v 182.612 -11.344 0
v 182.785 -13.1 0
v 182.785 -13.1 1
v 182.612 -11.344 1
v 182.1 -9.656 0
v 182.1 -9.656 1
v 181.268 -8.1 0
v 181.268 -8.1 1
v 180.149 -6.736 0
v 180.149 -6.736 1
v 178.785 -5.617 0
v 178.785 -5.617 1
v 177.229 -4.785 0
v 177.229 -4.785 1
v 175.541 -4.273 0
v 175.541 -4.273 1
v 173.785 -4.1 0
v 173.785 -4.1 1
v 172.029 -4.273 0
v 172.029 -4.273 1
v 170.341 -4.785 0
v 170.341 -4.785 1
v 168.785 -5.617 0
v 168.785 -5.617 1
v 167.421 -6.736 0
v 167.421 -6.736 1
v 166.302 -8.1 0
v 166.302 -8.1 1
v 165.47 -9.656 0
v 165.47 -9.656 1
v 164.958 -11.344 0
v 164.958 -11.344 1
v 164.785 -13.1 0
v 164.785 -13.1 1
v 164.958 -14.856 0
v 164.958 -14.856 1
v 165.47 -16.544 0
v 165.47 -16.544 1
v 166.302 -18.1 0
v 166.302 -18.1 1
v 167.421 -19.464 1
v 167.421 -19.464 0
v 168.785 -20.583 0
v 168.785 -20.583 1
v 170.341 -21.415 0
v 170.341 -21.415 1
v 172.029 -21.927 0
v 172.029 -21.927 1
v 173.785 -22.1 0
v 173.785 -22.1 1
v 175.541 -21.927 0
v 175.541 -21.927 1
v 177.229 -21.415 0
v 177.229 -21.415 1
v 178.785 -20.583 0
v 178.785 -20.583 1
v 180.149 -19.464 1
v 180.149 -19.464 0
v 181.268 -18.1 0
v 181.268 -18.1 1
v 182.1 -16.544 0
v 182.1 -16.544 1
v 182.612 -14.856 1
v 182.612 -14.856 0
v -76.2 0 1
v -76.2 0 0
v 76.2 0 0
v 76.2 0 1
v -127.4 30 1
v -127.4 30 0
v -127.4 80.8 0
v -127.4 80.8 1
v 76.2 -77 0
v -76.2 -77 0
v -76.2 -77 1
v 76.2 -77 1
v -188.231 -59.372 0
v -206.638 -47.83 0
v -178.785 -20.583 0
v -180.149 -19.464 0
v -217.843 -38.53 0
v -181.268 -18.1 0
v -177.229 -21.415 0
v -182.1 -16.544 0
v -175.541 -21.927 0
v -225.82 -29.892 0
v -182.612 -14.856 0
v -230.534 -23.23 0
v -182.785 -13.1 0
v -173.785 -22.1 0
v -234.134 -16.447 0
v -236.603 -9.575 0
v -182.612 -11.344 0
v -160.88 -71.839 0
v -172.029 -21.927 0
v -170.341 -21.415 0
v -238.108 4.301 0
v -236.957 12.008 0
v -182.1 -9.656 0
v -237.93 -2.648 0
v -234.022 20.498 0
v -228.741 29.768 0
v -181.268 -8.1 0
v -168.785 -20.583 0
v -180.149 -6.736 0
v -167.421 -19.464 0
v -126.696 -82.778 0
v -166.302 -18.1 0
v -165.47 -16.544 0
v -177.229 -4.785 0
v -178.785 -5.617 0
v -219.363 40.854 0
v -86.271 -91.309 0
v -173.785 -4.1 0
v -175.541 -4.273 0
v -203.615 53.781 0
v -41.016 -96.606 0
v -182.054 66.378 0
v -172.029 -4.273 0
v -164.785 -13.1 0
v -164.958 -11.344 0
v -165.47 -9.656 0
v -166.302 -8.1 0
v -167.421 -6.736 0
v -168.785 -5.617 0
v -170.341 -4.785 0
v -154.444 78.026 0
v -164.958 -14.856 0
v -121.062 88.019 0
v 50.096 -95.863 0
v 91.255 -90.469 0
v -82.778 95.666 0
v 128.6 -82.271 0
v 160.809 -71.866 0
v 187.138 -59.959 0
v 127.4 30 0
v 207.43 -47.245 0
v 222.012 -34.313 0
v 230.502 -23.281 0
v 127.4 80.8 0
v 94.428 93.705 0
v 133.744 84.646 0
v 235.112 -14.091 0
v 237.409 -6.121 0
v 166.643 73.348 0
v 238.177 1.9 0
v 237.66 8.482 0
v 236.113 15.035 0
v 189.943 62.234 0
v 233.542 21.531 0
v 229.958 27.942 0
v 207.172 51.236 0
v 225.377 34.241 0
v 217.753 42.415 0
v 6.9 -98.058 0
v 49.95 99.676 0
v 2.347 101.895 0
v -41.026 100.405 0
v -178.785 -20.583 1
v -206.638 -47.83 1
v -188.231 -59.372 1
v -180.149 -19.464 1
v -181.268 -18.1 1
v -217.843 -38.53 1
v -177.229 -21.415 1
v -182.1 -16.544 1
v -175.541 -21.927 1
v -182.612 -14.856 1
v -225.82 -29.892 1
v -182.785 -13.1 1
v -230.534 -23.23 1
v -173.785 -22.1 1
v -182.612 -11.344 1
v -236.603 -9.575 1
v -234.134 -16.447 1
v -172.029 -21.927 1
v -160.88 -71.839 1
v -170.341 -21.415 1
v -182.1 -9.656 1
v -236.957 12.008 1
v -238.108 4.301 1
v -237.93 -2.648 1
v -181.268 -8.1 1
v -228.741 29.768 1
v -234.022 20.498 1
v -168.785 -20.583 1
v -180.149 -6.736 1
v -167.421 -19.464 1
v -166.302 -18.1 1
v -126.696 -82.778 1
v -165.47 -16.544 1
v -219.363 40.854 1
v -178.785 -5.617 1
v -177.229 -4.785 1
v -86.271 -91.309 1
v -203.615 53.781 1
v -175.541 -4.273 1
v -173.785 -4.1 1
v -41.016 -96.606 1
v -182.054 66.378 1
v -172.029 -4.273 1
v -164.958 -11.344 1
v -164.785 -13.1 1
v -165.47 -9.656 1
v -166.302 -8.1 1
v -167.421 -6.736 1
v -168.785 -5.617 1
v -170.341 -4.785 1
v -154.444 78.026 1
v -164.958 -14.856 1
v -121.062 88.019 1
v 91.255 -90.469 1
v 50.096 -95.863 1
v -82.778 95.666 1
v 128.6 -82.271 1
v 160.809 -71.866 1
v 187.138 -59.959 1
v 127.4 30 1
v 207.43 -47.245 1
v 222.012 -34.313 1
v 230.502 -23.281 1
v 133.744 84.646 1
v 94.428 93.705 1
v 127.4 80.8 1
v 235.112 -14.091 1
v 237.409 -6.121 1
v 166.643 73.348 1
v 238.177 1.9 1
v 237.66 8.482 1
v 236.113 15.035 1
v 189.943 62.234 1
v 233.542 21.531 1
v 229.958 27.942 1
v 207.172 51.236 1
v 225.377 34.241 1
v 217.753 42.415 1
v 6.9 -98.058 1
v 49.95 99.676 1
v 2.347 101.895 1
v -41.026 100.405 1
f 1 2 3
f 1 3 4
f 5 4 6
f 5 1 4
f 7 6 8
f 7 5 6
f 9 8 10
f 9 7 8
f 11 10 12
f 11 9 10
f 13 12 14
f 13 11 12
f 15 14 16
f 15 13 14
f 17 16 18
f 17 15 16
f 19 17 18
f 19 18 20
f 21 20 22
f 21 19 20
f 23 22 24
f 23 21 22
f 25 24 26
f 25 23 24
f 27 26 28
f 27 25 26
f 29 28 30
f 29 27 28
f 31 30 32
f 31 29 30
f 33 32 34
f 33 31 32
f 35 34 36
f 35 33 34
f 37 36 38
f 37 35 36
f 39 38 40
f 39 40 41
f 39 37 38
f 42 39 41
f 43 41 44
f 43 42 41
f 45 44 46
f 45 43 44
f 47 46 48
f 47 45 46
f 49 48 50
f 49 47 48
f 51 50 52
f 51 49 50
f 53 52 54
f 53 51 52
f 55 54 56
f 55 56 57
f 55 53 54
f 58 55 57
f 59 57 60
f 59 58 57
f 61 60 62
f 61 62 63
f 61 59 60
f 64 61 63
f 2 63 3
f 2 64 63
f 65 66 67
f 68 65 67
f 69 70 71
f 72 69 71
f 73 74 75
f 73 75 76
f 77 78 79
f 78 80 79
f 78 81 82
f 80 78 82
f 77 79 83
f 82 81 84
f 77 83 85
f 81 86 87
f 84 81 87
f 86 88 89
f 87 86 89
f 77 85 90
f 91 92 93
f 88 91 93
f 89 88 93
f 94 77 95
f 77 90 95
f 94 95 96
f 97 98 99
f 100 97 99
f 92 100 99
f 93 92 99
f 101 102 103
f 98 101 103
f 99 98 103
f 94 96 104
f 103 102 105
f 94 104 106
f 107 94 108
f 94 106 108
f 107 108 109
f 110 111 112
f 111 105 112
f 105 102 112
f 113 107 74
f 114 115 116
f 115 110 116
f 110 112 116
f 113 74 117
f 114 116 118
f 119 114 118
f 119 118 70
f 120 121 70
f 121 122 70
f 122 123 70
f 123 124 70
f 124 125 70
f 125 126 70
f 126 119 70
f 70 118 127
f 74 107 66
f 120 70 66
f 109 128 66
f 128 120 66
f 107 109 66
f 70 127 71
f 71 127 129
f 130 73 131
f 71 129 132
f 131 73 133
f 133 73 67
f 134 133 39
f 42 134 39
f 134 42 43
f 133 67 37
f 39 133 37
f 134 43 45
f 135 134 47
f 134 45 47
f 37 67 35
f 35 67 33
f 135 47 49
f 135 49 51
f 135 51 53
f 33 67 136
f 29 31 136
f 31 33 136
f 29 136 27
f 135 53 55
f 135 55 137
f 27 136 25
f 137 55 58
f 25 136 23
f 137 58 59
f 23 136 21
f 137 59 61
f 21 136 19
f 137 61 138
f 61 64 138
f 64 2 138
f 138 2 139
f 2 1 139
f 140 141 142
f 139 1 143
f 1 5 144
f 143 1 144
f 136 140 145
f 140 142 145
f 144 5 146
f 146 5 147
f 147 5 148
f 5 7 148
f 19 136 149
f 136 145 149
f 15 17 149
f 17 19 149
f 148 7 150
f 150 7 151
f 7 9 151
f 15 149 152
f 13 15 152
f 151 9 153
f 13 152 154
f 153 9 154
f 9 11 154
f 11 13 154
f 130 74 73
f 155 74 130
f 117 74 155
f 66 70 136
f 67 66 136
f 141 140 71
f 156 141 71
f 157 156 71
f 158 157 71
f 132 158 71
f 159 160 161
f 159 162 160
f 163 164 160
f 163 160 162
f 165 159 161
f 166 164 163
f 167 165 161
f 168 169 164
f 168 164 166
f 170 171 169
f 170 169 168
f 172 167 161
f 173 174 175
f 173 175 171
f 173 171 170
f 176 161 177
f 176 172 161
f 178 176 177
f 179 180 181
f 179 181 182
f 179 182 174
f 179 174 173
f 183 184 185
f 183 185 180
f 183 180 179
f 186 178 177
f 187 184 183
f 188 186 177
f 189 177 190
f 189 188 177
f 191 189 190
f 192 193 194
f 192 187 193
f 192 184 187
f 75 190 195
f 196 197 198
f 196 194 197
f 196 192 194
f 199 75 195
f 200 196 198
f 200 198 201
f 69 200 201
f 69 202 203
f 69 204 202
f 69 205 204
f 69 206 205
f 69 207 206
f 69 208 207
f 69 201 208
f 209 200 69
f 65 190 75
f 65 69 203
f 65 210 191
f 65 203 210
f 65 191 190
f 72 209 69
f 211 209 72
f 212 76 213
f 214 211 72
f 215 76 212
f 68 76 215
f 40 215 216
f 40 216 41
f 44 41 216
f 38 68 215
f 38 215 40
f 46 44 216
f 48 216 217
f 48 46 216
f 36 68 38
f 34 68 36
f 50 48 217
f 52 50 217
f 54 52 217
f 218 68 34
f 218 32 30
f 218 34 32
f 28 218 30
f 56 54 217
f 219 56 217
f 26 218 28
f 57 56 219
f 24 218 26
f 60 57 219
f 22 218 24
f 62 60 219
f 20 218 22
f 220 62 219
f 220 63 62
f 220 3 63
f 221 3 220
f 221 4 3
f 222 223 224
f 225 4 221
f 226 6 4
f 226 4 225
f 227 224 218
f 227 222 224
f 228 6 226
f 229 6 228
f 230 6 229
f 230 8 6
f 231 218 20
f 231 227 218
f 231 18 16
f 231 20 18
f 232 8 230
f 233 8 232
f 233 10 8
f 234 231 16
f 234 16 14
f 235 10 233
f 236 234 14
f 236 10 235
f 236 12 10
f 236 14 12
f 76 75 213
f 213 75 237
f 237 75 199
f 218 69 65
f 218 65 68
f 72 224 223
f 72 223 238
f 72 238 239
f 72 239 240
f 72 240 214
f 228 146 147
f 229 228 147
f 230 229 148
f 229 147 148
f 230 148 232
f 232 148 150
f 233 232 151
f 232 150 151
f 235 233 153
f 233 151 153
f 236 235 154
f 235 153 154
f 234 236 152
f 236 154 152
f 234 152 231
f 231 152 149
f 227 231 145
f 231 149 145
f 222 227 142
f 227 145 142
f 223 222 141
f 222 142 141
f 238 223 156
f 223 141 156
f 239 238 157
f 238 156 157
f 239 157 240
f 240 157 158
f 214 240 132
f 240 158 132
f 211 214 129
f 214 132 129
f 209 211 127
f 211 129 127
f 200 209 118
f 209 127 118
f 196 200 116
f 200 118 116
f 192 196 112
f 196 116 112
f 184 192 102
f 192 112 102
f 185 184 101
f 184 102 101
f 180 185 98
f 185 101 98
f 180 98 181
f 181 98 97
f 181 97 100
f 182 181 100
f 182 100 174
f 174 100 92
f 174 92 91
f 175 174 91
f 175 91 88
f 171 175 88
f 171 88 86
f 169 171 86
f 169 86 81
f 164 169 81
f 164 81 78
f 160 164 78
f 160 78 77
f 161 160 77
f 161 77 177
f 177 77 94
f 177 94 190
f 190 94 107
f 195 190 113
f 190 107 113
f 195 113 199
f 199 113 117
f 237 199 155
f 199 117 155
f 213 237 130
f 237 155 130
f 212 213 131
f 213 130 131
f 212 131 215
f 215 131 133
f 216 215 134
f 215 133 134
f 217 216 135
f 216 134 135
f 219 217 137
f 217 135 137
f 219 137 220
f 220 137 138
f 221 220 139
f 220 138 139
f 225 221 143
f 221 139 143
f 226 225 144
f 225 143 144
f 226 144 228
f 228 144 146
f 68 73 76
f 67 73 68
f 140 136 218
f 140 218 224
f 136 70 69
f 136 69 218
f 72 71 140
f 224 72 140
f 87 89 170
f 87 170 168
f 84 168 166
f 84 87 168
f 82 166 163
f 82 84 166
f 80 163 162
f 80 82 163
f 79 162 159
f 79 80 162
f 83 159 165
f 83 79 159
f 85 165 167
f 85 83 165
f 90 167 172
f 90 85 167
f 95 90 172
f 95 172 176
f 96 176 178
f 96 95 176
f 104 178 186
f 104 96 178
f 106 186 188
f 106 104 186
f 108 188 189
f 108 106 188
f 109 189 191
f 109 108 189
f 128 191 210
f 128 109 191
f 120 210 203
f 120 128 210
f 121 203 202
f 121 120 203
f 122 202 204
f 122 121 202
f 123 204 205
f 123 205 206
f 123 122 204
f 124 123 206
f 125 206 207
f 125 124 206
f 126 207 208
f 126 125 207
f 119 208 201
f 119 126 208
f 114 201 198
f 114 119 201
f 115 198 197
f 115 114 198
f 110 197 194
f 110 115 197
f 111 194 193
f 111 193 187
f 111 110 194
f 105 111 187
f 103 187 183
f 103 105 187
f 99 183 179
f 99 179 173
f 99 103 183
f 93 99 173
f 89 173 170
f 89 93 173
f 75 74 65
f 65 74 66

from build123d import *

# Parameters (mm, degrees)
FUSELAGE_FRONT_RX          = 238.17677875
FUSELAGE_FRONT_RY          = 100
FUSELAGE_FRONT_R           = 9
FUSELAGE_FRONT_W           = 254.8
FUSELAGE_FRONT_H           = 50.8
FUSELAGE_FRONT_W_2         = 152.4
FUSELAGE_FRONT_H_2         = 77
FUSELAGE_FRONT_PLATE_DEPTH = 1


with BuildPart() as part:
    # fuselage_front → fuselage_front_plate (new body)
    with BuildSketch(Plane.XY):
        with Locations(Location((0, 1.9), (0, 0, 0))):
            Ellipse(FUSELAGE_FRONT_RX, FUSELAGE_FRONT_RY)
        with Locations((173.785, -13.1)):
            Circle(FUSELAGE_FRONT_R, mode=Mode.SUBTRACT)
        with Locations(Location((-173.785, -13.1, 0), (0, 0, 180))):
            Circle(FUSELAGE_FRONT_R, mode=Mode.SUBTRACT)
        with Locations((0, 55.4)):
            Rectangle(FUSELAGE_FRONT_W, FUSELAGE_FRONT_H, mode=Mode.SUBTRACT)
        with Locations((0, -38.5)):
            Rectangle(FUSELAGE_FRONT_W_2, FUSELAGE_FRONT_H_2, mode=Mode.SUBTRACT)
    extrude(amount=FUSELAGE_FRONT_PLATE_DEPTH)


solid = part.part
